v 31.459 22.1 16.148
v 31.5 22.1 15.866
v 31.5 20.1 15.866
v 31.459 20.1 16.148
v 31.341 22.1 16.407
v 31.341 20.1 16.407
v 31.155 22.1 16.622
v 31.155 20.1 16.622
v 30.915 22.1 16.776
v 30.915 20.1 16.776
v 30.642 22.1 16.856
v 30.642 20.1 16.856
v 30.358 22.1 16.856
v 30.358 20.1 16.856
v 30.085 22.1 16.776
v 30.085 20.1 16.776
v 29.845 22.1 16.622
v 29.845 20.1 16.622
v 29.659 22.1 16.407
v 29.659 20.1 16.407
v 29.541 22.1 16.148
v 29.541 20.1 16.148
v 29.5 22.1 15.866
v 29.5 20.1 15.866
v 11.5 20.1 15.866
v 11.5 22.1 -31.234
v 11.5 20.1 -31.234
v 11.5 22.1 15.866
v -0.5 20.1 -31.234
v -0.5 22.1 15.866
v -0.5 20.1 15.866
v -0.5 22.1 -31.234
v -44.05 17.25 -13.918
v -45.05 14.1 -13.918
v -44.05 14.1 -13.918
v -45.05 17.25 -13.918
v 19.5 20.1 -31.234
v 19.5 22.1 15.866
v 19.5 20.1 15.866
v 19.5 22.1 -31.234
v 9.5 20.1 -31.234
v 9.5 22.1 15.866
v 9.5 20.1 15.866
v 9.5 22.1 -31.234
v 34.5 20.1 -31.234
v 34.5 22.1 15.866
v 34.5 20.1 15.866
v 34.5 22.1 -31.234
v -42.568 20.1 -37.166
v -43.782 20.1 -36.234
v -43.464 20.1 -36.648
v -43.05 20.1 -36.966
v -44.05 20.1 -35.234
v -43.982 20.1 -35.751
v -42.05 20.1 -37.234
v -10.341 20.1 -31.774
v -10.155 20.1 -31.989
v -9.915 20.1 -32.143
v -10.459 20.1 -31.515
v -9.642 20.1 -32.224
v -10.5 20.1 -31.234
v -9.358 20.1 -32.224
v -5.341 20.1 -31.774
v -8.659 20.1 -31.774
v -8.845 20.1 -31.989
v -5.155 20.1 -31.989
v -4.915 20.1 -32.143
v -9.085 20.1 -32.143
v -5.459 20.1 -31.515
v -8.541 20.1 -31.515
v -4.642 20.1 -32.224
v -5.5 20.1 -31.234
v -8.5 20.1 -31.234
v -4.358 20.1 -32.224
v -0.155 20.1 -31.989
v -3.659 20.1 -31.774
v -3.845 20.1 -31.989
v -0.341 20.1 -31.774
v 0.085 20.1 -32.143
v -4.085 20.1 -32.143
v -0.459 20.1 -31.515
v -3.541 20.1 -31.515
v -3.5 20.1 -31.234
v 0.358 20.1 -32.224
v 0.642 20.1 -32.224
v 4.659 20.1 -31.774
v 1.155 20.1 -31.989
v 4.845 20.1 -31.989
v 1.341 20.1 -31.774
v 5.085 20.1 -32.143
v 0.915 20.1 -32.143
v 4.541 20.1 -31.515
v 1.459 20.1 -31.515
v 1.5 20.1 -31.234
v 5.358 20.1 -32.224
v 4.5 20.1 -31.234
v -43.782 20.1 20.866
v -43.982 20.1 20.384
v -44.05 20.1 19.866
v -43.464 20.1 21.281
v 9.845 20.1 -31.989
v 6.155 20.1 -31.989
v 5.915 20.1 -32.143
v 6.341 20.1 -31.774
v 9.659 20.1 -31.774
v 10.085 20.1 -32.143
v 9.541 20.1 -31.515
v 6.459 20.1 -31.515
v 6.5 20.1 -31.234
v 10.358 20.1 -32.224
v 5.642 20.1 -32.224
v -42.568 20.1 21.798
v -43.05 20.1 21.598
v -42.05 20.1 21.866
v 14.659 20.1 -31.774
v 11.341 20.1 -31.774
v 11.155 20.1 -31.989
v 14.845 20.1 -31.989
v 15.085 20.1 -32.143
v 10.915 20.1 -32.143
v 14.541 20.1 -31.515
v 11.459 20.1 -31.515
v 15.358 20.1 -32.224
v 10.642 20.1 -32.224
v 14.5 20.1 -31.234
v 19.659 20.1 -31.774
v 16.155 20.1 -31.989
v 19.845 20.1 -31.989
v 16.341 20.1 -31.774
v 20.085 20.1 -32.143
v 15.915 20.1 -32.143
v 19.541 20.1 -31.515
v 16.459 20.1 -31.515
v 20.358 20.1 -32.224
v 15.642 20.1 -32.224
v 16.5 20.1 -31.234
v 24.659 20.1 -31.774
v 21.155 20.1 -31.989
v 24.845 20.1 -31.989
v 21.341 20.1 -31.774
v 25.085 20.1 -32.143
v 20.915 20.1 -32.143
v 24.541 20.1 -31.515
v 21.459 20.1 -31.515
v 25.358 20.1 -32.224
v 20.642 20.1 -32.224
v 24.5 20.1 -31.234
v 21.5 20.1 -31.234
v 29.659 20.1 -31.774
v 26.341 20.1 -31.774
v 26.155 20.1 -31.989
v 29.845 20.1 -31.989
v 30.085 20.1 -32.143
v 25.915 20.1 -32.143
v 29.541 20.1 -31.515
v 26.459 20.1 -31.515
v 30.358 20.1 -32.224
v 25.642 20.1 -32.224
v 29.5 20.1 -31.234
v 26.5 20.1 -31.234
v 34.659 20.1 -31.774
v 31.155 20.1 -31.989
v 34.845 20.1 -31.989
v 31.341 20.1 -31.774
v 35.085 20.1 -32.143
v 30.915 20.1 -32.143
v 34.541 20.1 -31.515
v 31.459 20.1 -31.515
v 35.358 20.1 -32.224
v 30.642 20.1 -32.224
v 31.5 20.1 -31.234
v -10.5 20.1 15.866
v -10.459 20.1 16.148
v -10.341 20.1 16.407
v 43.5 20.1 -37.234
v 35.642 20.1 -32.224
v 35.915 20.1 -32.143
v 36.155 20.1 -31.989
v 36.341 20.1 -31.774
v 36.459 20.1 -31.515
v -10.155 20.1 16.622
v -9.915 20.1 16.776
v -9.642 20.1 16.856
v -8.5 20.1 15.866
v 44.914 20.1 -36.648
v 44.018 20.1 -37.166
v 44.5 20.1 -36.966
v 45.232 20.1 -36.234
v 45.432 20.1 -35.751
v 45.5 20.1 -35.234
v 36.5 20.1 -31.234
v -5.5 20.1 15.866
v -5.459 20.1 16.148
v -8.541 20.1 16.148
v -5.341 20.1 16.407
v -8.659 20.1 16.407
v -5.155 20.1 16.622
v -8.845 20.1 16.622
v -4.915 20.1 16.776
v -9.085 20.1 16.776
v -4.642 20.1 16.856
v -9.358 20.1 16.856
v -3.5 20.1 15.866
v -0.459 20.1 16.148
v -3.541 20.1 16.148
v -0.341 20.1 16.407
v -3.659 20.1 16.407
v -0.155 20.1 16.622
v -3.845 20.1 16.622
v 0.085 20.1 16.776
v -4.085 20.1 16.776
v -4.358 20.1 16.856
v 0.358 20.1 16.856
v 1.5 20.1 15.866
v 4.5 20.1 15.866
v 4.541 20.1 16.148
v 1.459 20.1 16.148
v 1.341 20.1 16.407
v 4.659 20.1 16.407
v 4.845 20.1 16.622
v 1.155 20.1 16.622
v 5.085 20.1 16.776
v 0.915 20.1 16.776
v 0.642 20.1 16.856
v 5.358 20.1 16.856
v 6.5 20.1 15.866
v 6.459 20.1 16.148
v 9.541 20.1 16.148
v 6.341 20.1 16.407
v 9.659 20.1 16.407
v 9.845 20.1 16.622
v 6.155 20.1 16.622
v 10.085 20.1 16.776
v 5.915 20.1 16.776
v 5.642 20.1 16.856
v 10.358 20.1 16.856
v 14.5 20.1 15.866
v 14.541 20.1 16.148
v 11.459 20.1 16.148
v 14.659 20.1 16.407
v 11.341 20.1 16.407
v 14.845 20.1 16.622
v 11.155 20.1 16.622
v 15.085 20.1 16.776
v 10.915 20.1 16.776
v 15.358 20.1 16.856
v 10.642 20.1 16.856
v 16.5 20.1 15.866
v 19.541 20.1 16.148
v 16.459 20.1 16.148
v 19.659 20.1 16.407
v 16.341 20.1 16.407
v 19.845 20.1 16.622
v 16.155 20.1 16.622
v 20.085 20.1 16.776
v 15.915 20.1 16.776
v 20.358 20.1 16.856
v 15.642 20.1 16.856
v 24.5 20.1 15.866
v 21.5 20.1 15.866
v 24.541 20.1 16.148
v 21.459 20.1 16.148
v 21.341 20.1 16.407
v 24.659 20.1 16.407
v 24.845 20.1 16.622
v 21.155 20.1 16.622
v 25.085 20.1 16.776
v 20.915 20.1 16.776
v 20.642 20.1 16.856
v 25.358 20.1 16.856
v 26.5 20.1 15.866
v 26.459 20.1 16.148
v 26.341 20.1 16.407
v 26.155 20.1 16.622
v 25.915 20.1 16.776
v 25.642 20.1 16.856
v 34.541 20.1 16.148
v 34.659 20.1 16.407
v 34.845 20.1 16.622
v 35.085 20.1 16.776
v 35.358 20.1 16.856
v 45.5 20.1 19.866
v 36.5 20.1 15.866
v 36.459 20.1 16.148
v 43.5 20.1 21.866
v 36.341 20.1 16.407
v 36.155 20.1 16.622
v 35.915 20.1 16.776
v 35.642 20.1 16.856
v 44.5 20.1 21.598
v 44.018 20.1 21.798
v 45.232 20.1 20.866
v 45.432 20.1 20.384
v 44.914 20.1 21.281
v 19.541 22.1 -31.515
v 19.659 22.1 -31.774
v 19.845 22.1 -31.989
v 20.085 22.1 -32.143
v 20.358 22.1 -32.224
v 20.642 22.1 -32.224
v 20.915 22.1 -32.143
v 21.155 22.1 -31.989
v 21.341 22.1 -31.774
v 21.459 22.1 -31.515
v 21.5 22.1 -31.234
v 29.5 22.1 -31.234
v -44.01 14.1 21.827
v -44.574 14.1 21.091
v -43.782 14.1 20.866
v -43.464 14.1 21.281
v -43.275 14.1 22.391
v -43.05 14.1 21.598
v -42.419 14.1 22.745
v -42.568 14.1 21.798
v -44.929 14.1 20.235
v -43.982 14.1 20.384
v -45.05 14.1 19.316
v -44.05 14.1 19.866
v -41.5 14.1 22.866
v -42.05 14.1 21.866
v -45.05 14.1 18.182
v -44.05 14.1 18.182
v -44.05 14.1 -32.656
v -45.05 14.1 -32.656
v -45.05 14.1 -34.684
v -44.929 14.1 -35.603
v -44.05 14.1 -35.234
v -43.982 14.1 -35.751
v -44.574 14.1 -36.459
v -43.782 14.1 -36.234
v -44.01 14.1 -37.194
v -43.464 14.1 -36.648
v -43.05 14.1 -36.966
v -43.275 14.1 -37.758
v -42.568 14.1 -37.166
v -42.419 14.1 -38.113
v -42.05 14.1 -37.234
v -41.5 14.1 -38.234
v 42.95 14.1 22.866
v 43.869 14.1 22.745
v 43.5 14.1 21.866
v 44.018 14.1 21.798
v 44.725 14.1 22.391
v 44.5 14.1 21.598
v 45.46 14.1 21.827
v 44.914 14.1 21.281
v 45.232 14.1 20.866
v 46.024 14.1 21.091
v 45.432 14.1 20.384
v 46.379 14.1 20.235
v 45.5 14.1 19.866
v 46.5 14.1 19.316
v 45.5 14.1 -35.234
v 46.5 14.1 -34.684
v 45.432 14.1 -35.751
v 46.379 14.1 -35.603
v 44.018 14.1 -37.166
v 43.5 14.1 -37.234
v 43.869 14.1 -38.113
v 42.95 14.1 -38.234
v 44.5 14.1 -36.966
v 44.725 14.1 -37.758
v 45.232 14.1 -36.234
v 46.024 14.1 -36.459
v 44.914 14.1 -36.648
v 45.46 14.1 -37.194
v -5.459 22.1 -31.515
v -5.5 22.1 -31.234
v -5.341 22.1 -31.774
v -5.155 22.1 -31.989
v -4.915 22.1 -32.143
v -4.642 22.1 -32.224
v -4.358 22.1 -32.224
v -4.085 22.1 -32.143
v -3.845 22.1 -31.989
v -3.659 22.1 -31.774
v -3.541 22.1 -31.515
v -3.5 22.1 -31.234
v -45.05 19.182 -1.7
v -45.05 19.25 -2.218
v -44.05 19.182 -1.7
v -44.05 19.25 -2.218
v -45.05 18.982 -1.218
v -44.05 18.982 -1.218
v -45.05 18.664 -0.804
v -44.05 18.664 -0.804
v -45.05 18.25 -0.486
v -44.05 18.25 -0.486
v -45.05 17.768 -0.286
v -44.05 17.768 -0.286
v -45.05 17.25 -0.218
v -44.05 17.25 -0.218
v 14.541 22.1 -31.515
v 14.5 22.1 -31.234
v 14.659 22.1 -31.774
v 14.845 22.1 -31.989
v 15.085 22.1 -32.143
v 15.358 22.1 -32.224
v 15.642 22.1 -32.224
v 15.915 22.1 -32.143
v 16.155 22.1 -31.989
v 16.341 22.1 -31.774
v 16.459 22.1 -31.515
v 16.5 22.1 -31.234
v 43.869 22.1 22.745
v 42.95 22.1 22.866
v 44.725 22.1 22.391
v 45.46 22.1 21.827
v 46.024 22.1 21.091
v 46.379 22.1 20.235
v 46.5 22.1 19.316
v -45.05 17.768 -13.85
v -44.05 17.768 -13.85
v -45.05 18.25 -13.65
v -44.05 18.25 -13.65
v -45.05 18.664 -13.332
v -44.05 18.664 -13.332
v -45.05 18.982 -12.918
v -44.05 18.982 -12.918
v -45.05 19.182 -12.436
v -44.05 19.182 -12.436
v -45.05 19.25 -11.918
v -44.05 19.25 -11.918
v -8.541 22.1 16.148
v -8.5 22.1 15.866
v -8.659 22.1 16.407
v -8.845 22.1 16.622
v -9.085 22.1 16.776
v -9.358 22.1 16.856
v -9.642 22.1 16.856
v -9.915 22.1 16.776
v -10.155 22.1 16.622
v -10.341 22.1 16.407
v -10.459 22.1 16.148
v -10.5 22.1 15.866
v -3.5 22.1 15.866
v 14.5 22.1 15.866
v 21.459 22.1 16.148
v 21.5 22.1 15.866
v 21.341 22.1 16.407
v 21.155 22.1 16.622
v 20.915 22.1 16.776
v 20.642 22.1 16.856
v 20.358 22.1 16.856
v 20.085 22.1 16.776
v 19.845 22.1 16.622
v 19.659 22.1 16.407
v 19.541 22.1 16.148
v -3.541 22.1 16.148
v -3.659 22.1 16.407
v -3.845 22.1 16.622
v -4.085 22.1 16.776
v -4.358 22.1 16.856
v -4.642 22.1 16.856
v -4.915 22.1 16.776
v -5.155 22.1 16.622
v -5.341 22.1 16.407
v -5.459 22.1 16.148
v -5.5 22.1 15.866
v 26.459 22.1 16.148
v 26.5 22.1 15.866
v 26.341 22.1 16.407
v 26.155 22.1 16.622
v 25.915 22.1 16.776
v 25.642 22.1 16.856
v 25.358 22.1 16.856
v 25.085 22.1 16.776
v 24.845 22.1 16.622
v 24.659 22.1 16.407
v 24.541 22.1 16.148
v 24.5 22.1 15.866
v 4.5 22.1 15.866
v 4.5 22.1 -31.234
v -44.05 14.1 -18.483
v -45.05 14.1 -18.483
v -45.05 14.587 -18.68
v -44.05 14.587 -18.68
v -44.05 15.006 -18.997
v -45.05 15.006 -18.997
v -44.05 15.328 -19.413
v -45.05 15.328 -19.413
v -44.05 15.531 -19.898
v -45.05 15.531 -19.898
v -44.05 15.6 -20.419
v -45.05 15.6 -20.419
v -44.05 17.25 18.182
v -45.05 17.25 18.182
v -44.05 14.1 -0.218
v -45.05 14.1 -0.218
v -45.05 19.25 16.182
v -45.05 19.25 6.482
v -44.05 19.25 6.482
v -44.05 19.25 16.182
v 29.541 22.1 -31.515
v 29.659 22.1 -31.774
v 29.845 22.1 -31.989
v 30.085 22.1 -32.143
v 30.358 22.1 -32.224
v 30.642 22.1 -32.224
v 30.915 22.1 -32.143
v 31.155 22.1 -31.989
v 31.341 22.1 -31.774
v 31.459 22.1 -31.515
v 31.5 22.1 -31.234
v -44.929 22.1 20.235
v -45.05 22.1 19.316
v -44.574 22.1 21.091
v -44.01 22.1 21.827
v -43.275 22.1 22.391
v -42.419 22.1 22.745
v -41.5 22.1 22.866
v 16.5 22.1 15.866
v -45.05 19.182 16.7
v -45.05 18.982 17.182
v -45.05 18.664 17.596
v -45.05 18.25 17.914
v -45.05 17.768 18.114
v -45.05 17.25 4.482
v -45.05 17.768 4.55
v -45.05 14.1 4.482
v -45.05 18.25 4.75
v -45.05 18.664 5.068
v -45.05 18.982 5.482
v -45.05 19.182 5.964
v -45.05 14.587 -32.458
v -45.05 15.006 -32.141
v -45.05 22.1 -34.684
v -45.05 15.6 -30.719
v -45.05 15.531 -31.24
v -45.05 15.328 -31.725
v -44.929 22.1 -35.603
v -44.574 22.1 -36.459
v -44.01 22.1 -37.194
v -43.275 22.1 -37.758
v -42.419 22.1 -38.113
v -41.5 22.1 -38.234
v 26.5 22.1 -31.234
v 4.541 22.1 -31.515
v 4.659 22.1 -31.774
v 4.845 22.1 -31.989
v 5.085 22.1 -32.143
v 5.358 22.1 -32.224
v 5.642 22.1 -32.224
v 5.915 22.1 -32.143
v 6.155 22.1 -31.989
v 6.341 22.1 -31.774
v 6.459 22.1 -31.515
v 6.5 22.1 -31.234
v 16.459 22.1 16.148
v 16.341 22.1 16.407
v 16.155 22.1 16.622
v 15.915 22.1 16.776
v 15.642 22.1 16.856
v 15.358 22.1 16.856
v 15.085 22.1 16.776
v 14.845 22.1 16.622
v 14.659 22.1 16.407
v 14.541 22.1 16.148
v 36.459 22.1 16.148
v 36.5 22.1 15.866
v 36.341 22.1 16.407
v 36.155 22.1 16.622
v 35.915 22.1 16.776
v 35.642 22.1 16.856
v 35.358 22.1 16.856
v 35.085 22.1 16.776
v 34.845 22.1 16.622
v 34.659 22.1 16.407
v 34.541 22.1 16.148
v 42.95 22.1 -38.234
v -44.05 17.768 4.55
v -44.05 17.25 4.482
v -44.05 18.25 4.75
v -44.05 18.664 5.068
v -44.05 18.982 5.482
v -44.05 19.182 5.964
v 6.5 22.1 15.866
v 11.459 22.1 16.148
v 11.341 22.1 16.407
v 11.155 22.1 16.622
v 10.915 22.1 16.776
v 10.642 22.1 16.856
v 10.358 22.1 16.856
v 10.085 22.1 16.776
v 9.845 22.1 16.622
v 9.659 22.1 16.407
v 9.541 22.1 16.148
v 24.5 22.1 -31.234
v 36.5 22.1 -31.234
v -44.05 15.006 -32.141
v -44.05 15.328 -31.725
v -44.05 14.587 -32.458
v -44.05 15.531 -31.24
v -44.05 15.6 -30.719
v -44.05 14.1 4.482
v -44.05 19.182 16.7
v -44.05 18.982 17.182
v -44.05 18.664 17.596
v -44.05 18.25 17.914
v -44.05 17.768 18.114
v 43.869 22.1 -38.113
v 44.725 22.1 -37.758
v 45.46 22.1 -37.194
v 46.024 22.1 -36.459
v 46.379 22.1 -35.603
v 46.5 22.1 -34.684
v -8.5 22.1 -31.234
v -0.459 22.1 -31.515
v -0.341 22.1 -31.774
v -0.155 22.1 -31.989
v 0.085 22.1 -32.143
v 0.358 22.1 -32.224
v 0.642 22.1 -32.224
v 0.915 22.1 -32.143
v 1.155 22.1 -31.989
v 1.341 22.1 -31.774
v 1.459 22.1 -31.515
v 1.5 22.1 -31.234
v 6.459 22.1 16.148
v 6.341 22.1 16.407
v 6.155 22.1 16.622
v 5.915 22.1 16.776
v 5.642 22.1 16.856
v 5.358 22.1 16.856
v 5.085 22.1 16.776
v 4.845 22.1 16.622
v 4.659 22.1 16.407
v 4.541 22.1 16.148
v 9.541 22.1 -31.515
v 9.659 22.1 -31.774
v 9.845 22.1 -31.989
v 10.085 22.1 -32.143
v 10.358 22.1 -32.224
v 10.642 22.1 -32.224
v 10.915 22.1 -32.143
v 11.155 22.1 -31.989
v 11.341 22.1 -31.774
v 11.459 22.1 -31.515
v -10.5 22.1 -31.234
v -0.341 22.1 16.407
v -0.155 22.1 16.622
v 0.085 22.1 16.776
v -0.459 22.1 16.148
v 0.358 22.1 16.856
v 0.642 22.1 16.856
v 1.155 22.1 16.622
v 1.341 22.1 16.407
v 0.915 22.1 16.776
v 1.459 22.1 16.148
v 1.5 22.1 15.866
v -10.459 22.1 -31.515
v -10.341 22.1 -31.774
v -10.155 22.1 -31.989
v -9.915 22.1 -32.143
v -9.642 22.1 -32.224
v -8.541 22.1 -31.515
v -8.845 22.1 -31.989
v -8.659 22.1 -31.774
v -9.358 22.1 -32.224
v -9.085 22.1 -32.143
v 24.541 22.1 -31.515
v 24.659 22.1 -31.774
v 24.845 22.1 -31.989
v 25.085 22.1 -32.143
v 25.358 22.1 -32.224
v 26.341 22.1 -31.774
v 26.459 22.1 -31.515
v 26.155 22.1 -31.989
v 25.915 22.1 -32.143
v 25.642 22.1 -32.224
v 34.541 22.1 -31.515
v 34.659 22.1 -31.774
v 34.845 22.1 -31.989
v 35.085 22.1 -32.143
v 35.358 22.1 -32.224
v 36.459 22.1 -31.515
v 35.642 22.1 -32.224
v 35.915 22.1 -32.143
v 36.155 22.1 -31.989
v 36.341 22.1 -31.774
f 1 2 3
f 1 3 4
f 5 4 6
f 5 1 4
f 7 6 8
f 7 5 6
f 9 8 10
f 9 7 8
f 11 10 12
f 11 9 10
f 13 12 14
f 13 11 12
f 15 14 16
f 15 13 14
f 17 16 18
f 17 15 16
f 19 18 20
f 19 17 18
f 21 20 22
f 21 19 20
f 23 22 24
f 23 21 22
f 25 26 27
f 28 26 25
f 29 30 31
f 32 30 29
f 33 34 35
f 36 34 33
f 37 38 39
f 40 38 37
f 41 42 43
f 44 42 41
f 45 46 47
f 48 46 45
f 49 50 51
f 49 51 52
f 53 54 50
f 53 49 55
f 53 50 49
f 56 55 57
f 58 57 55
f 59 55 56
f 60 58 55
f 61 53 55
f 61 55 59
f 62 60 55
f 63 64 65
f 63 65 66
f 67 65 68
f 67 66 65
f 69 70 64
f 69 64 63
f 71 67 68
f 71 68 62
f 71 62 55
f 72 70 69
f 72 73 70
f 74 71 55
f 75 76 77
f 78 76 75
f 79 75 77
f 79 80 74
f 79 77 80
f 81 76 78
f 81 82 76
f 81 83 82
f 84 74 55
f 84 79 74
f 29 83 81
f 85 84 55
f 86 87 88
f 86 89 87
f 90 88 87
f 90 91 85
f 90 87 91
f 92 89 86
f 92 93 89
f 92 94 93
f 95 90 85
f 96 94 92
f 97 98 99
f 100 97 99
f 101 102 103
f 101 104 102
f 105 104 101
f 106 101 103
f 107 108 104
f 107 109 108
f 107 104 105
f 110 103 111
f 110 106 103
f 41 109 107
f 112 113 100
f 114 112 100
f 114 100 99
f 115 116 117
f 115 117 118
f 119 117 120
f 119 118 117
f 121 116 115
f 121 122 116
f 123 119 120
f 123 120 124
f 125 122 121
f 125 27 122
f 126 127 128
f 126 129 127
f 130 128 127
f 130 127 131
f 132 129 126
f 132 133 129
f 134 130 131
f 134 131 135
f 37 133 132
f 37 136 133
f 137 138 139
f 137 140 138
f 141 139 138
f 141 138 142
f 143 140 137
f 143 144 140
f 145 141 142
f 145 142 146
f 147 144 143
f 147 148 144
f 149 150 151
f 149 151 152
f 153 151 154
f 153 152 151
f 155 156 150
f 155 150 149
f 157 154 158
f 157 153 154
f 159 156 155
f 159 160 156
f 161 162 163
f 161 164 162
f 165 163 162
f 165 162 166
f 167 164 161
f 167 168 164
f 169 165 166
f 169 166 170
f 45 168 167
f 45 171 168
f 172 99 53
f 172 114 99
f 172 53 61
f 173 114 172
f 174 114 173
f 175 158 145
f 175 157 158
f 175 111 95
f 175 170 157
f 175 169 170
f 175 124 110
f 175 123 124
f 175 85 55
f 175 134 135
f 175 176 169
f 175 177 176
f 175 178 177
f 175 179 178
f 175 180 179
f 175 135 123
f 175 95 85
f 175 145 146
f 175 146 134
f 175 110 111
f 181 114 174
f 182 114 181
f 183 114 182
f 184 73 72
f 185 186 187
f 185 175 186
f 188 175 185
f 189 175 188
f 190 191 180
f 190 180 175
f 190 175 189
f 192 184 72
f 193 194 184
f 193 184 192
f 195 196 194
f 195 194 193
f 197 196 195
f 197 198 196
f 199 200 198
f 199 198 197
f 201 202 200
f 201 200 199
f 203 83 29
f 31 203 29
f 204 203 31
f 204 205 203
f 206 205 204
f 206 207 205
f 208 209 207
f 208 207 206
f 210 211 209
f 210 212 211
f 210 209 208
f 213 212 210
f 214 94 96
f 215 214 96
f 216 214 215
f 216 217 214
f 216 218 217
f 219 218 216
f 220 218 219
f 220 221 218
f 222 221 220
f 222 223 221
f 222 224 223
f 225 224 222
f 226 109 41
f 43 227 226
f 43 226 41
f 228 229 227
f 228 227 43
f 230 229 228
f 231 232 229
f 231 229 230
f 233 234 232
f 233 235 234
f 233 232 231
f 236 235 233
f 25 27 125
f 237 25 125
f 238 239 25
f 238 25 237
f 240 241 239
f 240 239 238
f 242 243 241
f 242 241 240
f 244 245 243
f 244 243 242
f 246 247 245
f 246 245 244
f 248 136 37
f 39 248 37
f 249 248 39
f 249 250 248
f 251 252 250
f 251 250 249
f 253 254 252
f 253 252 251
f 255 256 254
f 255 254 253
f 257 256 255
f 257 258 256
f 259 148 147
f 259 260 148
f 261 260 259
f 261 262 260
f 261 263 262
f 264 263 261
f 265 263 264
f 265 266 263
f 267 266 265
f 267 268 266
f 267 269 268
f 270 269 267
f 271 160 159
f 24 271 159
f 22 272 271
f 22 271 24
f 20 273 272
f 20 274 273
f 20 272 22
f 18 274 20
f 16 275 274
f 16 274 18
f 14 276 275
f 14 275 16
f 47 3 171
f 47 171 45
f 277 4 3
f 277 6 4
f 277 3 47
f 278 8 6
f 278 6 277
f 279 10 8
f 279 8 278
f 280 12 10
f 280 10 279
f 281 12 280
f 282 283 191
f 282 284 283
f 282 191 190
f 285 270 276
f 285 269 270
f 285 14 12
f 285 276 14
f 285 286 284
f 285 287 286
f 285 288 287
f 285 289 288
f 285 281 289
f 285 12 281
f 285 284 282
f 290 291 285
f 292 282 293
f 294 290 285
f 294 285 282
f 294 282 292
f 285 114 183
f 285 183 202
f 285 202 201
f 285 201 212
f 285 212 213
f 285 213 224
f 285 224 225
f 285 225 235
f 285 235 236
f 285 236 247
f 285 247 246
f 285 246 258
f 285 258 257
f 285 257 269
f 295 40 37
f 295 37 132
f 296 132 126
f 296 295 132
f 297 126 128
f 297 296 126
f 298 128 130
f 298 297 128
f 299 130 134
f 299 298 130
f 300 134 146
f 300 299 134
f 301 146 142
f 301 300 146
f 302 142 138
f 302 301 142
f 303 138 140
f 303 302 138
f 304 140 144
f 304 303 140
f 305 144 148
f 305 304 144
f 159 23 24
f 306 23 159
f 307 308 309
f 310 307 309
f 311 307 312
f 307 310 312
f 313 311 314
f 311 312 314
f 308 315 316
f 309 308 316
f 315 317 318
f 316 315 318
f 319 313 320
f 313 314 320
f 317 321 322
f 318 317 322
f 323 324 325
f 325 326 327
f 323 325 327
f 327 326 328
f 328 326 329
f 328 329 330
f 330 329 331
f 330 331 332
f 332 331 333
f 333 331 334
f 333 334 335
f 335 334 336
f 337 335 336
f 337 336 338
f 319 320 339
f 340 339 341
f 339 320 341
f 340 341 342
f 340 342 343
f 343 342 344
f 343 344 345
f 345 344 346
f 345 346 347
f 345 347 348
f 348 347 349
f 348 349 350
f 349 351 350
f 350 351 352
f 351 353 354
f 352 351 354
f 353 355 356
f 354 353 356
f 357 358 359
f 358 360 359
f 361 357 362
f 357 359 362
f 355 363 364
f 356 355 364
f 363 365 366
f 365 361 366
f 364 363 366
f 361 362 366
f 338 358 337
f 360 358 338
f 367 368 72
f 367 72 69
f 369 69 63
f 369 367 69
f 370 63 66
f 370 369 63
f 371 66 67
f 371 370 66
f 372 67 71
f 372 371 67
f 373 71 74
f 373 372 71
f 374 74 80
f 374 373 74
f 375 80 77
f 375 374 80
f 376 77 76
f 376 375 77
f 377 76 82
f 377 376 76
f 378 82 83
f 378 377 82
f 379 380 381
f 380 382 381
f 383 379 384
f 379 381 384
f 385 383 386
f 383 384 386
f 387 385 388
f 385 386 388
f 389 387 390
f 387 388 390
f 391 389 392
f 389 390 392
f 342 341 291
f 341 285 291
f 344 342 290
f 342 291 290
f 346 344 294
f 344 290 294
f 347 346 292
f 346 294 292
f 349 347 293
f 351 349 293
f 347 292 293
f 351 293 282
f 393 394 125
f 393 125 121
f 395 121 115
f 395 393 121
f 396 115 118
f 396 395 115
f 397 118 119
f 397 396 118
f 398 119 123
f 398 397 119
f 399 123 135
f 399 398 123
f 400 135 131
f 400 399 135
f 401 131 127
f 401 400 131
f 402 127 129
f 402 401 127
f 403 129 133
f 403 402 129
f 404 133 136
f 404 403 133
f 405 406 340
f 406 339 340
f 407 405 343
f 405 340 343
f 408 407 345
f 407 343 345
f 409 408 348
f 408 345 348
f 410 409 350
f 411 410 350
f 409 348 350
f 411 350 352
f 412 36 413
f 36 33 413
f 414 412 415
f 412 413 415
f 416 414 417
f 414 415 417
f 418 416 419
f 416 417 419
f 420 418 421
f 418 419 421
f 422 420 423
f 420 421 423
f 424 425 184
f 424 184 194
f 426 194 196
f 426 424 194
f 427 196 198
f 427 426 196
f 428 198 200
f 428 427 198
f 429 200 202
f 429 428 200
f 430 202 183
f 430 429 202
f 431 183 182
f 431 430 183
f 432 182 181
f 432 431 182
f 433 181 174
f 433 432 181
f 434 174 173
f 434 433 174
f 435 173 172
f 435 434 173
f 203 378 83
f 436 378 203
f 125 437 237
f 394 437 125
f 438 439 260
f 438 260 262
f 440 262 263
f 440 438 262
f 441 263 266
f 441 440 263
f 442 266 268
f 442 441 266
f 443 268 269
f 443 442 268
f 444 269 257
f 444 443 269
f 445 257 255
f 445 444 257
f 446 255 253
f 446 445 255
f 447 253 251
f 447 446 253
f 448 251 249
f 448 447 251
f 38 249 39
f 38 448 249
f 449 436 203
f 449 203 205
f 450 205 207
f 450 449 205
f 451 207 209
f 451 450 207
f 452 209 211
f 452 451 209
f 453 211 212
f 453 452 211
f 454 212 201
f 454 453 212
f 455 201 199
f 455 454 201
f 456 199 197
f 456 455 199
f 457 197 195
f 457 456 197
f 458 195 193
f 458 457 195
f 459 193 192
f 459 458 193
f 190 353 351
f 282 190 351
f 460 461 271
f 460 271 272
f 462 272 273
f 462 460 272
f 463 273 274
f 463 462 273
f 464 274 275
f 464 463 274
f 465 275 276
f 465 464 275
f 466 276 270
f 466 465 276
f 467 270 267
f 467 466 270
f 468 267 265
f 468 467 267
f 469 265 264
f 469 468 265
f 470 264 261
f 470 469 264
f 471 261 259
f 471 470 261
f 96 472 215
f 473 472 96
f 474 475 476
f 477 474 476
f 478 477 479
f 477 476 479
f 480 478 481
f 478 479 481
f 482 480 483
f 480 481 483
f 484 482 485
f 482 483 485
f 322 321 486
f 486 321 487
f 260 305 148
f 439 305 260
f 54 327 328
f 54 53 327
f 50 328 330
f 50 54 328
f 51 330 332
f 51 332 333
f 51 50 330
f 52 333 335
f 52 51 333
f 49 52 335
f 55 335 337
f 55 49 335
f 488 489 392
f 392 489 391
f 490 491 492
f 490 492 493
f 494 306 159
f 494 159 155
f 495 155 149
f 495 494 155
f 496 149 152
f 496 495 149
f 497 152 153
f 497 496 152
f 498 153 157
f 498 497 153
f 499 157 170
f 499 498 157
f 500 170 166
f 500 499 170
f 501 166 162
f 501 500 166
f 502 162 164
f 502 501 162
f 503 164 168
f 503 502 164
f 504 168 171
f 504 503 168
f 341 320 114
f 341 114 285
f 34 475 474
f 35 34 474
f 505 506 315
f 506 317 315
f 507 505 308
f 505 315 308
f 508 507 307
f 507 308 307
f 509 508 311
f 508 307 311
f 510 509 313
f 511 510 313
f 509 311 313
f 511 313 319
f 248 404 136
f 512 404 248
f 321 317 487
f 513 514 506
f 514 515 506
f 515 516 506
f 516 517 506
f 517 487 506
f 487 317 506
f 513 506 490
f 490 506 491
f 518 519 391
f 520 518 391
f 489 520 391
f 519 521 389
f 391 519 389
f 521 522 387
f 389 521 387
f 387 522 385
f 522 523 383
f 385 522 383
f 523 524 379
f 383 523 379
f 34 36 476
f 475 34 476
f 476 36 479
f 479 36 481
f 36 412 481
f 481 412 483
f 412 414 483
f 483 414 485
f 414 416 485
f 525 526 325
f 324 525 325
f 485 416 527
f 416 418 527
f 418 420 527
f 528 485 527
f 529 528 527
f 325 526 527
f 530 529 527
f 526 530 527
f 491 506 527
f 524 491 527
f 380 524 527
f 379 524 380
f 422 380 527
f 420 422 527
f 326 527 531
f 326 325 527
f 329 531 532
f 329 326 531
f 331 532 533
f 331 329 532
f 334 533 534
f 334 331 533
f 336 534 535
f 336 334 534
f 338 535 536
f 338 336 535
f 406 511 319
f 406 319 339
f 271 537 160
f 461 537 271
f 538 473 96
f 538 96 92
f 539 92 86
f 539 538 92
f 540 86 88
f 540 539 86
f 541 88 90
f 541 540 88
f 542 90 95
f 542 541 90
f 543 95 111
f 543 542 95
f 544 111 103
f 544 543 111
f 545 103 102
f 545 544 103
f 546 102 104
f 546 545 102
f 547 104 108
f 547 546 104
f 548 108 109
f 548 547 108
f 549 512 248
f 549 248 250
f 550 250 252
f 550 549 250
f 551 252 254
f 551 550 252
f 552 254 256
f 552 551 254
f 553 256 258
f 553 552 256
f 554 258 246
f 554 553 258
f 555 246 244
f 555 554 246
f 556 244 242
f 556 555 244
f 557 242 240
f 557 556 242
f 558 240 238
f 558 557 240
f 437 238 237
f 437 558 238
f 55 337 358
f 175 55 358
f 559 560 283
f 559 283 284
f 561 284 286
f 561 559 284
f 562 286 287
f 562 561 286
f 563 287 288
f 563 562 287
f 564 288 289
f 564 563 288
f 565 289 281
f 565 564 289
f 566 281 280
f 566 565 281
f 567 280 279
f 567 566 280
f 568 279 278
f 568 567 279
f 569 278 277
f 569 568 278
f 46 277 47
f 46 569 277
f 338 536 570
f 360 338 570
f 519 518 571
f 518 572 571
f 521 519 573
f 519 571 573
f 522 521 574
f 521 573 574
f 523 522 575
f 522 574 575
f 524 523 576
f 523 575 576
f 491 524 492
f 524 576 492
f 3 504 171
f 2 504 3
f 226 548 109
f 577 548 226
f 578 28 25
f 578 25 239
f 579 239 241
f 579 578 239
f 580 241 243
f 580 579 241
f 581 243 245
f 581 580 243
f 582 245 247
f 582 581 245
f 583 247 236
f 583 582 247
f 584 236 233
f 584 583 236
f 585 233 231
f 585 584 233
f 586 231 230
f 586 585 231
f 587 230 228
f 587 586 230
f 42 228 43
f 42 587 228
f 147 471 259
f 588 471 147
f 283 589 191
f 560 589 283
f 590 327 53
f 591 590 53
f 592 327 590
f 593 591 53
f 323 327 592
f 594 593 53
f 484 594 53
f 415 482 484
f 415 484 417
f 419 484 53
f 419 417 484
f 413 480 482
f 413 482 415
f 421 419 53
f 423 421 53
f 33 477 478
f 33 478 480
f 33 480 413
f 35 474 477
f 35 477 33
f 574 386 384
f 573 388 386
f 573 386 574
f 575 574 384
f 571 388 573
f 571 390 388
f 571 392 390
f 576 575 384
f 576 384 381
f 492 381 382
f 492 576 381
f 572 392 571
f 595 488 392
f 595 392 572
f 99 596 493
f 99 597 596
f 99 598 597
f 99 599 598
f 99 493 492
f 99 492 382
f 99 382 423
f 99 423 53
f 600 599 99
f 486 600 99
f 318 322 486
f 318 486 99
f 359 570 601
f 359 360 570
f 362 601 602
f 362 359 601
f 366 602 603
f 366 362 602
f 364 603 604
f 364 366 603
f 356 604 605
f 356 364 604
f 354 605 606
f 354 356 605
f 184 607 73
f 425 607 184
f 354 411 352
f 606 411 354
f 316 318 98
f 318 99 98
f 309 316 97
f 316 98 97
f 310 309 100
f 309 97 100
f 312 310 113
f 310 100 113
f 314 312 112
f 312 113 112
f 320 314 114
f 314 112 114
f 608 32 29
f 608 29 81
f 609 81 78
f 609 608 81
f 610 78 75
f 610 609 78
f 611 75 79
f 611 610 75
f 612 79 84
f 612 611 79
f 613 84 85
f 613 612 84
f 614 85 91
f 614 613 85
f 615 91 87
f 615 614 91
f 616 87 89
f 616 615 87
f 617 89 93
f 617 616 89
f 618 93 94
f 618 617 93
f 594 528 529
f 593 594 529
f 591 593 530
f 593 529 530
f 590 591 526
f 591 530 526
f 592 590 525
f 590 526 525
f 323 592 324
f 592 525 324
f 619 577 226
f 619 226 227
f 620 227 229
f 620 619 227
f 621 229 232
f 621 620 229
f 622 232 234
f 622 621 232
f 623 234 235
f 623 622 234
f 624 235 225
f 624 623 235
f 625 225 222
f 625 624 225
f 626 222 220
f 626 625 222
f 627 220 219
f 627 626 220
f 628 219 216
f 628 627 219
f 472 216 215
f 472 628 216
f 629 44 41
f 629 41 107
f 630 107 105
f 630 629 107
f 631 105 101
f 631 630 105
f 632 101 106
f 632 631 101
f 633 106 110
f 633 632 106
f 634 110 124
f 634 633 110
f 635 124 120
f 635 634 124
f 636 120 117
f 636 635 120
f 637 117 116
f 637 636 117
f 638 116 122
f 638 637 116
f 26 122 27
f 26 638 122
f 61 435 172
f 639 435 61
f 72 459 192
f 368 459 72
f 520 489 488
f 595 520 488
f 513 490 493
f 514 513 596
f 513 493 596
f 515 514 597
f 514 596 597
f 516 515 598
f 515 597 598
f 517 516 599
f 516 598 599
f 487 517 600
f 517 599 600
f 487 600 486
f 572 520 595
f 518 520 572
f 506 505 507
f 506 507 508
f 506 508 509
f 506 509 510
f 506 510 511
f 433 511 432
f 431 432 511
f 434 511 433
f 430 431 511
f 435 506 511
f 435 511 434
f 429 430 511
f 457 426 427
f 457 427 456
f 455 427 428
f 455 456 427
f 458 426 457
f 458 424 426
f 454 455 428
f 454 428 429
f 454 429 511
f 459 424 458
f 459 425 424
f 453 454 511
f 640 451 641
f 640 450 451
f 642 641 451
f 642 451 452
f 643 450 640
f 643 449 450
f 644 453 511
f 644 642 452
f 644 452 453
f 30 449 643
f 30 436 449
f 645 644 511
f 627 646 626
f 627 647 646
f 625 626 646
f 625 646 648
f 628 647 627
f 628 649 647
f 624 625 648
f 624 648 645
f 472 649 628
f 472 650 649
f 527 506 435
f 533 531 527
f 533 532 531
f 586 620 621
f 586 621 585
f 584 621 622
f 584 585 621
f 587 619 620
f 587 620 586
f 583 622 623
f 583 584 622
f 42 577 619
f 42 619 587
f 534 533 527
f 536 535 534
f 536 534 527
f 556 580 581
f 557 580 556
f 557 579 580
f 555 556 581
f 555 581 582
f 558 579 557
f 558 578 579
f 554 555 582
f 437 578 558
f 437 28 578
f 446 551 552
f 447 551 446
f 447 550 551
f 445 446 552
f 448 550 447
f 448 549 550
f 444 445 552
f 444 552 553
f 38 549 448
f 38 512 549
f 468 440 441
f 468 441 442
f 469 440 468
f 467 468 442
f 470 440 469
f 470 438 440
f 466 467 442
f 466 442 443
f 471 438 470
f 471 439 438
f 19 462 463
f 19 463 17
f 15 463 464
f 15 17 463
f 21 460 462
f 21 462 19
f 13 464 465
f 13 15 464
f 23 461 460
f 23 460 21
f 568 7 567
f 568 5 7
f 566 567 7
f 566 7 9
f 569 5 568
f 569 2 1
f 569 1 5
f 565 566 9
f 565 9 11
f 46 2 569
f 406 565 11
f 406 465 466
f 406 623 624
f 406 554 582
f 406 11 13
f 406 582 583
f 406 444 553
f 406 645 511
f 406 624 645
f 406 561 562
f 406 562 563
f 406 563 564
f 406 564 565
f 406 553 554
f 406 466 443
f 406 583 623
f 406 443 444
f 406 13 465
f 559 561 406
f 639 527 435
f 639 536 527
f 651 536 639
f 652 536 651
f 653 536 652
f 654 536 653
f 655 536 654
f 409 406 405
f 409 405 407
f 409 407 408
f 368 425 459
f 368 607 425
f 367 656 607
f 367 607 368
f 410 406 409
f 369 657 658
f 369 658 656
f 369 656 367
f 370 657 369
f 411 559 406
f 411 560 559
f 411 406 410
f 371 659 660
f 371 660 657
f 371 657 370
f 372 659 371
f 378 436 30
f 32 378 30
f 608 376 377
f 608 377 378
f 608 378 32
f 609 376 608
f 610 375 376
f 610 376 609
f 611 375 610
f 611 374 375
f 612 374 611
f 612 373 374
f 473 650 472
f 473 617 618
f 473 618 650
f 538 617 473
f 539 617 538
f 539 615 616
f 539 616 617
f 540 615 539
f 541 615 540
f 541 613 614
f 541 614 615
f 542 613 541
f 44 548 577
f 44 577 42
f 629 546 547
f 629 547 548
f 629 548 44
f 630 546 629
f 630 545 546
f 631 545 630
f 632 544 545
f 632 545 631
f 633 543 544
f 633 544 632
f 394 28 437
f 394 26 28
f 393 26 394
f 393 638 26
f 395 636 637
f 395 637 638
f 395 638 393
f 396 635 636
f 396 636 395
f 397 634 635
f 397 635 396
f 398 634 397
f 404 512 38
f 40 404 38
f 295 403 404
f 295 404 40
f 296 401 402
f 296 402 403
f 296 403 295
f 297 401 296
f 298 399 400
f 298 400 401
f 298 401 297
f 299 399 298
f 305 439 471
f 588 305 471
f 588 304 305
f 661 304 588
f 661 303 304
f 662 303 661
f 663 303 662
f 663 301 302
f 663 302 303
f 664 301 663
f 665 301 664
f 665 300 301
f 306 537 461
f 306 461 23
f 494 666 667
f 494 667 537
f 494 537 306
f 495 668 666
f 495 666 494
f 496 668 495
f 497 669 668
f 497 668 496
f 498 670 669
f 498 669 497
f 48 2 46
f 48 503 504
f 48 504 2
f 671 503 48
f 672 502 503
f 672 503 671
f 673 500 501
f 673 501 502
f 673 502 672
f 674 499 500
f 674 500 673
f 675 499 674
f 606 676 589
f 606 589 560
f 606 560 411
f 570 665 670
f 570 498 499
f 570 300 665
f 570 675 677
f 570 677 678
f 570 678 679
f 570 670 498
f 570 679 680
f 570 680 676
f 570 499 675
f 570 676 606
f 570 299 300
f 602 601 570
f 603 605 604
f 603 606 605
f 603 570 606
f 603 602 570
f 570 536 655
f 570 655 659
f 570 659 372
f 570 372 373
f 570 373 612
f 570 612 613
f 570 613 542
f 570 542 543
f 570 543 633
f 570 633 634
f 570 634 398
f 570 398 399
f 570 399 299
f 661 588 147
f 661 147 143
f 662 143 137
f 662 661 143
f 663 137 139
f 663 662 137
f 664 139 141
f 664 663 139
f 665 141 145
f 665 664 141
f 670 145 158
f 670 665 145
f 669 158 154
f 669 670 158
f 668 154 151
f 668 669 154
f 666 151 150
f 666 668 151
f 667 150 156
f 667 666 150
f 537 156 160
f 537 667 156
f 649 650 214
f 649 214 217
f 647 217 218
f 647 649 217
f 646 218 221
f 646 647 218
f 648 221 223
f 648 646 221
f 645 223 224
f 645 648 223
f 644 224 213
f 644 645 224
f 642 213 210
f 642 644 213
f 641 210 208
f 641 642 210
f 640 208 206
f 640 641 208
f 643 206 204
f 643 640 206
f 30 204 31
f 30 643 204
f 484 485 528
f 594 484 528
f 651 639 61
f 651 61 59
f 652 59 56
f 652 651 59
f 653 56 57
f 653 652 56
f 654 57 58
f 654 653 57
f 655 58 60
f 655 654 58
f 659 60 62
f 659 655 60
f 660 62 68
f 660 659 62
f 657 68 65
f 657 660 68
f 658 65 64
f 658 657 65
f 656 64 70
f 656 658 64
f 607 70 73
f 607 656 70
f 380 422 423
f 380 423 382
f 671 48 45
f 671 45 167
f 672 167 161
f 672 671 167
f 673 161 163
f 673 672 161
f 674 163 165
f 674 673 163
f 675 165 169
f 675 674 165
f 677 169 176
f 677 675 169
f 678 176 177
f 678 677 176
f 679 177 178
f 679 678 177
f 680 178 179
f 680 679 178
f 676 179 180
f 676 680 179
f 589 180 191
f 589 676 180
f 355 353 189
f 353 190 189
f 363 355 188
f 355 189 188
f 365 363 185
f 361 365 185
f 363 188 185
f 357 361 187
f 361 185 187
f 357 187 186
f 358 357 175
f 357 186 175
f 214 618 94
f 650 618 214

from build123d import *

# Parameters (mm, degrees)
SKETCH1_W           = 91.55
SKETCH1_H           = 61.1
BOSS_EXTRUDE1_DEPTH = 8
SKETCH2_W           = 89.55
SKETCH2_H           = 59.1
CUT_EXTRUDE1_DEPTH  = 6
CUT_EXTRUDE2_REACH  = 189.594
SKETCH3_W           = 13.7
SKETCH3_H           = 5.15
CUT_EXTRUDE3_REACH  = 189.594
SKETCH4_W           = 13.7
SKETCH4_H           = 5.15
CUT_EXTRUDE4_REACH  = 189.594
FILLET1_R           = 2
FILLET2_R           = 3.55
CUT_EXTRUDE5_DEPTH  = 2
LPATTERN1_COUNT     = 10
LPATTERN1_PITCH     = 5


with BuildPart() as part:
    # Sketch1 → Boss-Extrude1 (new body)
    with BuildSketch(Plane(origin=(0, 22.1, -139.373711609), x_dir=(1, 0, 0), z_dir=(0, 1, 0))):
        with Locations((0.725, -131.69)):
            Rectangle(SKETCH1_W, SKETCH1_H)
    extrude(amount=-BOSS_EXTRUDE1_DEPTH)

    # Sketch2 → Cut-Extrude1 (cut)
    with BuildSketch(Plane(origin=(0, 14.1, -139.373711609), x_dir=(1, 0, 0), z_dir=(0, -1, 0))):
        with Locations((0.725, 131.69)):
            Rectangle(SKETCH2_W, SKETCH2_H)
    extrude(amount=-CUT_EXTRUDE1_DEPTH, mode=Mode.SUBTRACT)

    # Sketch3 → Cut-Extrude2 (cut, up to next)
    with BuildSketch(Plane(origin=(-45.05, 0, -139.373711609), x_dir=(0, 0, 1), z_dir=(-1, 0, 0)), mode=Mode.PRIVATE) as cut_extrude2_sk1:
        with Locations((150.705690784, 16.675)):
            Rectangle(SKETCH3_W, SKETCH3_H)
    cut_extrude2_tool1 = extrude(cut_extrude2_sk1.sketch, amount=-CUT_EXTRUDE2_REACH, mode=Mode.PRIVATE) & part.part
    add(cut_extrude2_tool1.solids().sort_by_distance((-45.05, 16.675, 11.331979))[0], mode=Mode.SUBTRACT)

    # Sketch4 → Cut-Extrude3 (cut, up to next)
    with BuildSketch(Plane(origin=(-45.05, 0, -139.373711609), x_dir=(0, 0, 1), z_dir=(-1, 0, 0)), mode=Mode.PRIVATE) as cut_extrude3_sk1:
        with Locations((132.305690784, 16.675)):
            Rectangle(SKETCH4_W, SKETCH4_H)
    cut_extrude3_tool1 = extrude(cut_extrude3_sk1.sketch, amount=-CUT_EXTRUDE3_REACH, mode=Mode.PRIVATE) & part.part
    add(cut_extrude3_tool1.solids().sort_by_distance((-45.05, 16.675, -7.068021))[0], mode=Mode.SUBTRACT)

    # Sketch5 → Cut-Extrude4 (cut, up to next)
    with BuildSketch(Plane(origin=(-45.05, 0, -139.373711609), x_dir=(0, 0, 1), z_dir=(-1, 0, 0)), mode=Mode.PRIVATE) as cut_extrude4_sk1:
        with BuildLine():
            Line((106.718199777, 14.1), (120.891183123, 14.1))
            ThreePointArc((120.891183123, 14.1), (120.179436321, 15.18113883), (118.95469145, 15.6))
            Line((118.95469145, 15.6), (108.65469145, 15.6))
            ThreePointArc((108.65469145, 15.6), (107.429946578, 15.18113883), (106.718199777, 14.1))
        make_face()
    cut_extrude4_tool1 = extrude(cut_extrude4_sk1.sketch, amount=-CUT_EXTRUDE4_REACH, mode=Mode.PRIVATE) & part.part
    add(cut_extrude4_tool1.solids().sort_by_distance((-45.05, 14.822712, -25.56902))[0], mode=Mode.SUBTRACT)

    # Fillet1
    fillet1_edges = [part.edges().sort_by_distance(p)[0] for p in [
        (-44.05, 17.1, 21.866288391),
        (45.5, 17.1, 21.866288391),
        (45.5, 17.1, -37.233711609),
        (-44.05, 17.1, -37.233711609),
        (-44.55, 19.25, 18.181979175),
        (-44.55, 19.25, 4.481979175),
        (-44.55, 19.25, -0.218020825),
        (-44.55, 19.25, -13.918020825),
    ]]
    fillet(fillet1_edges, radius=FILLET1_R)

    # Fillet2
    fillet2_edges = [part.edges().sort_by_distance(p)[0] for p in [
        (-45.05, 18.1, 22.866288391),
        (-45.05, 18.1, -38.233711609),
        (46.5, 18.1, -38.233711609),
        (46.5, 18.1, 22.866288391),
    ]]
    fillet(fillet2_edges, radius=FILLET2_R)

    # Sketch6 → Cut-Extrude5 (cut)
    with BuildSketch(Plane(origin=(0, 22.1, 0), x_dir=(1, 0, 0), z_dir=(0, 1, 0))):
        with BuildLine():
            Line((36.5, 31.233711609), (36.5, -15.866288391))
            ThreePointArc((36.5, -15.866288391), (35.5, -16.866288391), (34.5, -15.866288391))
            Line((34.5, -15.866288391), (34.5, 31.233711609))
            ThreePointArc((34.5, 31.233711609), (35.5, 32.233711609), (36.5, 31.233711609))
        make_face()
    cut_extrude5 = extrude(amount=-CUT_EXTRUDE5_DEPTH, mode=Mode.SUBTRACT)

    # LPattern1: Cut-Extrude5 ×10
    with Locations(*[(-i * LPATTERN1_PITCH, 0, 0) for i in range(1, LPATTERN1_COUNT)]):
        add(cut_extrude5, mode=Mode.SUBTRACT)


solid = part.part
